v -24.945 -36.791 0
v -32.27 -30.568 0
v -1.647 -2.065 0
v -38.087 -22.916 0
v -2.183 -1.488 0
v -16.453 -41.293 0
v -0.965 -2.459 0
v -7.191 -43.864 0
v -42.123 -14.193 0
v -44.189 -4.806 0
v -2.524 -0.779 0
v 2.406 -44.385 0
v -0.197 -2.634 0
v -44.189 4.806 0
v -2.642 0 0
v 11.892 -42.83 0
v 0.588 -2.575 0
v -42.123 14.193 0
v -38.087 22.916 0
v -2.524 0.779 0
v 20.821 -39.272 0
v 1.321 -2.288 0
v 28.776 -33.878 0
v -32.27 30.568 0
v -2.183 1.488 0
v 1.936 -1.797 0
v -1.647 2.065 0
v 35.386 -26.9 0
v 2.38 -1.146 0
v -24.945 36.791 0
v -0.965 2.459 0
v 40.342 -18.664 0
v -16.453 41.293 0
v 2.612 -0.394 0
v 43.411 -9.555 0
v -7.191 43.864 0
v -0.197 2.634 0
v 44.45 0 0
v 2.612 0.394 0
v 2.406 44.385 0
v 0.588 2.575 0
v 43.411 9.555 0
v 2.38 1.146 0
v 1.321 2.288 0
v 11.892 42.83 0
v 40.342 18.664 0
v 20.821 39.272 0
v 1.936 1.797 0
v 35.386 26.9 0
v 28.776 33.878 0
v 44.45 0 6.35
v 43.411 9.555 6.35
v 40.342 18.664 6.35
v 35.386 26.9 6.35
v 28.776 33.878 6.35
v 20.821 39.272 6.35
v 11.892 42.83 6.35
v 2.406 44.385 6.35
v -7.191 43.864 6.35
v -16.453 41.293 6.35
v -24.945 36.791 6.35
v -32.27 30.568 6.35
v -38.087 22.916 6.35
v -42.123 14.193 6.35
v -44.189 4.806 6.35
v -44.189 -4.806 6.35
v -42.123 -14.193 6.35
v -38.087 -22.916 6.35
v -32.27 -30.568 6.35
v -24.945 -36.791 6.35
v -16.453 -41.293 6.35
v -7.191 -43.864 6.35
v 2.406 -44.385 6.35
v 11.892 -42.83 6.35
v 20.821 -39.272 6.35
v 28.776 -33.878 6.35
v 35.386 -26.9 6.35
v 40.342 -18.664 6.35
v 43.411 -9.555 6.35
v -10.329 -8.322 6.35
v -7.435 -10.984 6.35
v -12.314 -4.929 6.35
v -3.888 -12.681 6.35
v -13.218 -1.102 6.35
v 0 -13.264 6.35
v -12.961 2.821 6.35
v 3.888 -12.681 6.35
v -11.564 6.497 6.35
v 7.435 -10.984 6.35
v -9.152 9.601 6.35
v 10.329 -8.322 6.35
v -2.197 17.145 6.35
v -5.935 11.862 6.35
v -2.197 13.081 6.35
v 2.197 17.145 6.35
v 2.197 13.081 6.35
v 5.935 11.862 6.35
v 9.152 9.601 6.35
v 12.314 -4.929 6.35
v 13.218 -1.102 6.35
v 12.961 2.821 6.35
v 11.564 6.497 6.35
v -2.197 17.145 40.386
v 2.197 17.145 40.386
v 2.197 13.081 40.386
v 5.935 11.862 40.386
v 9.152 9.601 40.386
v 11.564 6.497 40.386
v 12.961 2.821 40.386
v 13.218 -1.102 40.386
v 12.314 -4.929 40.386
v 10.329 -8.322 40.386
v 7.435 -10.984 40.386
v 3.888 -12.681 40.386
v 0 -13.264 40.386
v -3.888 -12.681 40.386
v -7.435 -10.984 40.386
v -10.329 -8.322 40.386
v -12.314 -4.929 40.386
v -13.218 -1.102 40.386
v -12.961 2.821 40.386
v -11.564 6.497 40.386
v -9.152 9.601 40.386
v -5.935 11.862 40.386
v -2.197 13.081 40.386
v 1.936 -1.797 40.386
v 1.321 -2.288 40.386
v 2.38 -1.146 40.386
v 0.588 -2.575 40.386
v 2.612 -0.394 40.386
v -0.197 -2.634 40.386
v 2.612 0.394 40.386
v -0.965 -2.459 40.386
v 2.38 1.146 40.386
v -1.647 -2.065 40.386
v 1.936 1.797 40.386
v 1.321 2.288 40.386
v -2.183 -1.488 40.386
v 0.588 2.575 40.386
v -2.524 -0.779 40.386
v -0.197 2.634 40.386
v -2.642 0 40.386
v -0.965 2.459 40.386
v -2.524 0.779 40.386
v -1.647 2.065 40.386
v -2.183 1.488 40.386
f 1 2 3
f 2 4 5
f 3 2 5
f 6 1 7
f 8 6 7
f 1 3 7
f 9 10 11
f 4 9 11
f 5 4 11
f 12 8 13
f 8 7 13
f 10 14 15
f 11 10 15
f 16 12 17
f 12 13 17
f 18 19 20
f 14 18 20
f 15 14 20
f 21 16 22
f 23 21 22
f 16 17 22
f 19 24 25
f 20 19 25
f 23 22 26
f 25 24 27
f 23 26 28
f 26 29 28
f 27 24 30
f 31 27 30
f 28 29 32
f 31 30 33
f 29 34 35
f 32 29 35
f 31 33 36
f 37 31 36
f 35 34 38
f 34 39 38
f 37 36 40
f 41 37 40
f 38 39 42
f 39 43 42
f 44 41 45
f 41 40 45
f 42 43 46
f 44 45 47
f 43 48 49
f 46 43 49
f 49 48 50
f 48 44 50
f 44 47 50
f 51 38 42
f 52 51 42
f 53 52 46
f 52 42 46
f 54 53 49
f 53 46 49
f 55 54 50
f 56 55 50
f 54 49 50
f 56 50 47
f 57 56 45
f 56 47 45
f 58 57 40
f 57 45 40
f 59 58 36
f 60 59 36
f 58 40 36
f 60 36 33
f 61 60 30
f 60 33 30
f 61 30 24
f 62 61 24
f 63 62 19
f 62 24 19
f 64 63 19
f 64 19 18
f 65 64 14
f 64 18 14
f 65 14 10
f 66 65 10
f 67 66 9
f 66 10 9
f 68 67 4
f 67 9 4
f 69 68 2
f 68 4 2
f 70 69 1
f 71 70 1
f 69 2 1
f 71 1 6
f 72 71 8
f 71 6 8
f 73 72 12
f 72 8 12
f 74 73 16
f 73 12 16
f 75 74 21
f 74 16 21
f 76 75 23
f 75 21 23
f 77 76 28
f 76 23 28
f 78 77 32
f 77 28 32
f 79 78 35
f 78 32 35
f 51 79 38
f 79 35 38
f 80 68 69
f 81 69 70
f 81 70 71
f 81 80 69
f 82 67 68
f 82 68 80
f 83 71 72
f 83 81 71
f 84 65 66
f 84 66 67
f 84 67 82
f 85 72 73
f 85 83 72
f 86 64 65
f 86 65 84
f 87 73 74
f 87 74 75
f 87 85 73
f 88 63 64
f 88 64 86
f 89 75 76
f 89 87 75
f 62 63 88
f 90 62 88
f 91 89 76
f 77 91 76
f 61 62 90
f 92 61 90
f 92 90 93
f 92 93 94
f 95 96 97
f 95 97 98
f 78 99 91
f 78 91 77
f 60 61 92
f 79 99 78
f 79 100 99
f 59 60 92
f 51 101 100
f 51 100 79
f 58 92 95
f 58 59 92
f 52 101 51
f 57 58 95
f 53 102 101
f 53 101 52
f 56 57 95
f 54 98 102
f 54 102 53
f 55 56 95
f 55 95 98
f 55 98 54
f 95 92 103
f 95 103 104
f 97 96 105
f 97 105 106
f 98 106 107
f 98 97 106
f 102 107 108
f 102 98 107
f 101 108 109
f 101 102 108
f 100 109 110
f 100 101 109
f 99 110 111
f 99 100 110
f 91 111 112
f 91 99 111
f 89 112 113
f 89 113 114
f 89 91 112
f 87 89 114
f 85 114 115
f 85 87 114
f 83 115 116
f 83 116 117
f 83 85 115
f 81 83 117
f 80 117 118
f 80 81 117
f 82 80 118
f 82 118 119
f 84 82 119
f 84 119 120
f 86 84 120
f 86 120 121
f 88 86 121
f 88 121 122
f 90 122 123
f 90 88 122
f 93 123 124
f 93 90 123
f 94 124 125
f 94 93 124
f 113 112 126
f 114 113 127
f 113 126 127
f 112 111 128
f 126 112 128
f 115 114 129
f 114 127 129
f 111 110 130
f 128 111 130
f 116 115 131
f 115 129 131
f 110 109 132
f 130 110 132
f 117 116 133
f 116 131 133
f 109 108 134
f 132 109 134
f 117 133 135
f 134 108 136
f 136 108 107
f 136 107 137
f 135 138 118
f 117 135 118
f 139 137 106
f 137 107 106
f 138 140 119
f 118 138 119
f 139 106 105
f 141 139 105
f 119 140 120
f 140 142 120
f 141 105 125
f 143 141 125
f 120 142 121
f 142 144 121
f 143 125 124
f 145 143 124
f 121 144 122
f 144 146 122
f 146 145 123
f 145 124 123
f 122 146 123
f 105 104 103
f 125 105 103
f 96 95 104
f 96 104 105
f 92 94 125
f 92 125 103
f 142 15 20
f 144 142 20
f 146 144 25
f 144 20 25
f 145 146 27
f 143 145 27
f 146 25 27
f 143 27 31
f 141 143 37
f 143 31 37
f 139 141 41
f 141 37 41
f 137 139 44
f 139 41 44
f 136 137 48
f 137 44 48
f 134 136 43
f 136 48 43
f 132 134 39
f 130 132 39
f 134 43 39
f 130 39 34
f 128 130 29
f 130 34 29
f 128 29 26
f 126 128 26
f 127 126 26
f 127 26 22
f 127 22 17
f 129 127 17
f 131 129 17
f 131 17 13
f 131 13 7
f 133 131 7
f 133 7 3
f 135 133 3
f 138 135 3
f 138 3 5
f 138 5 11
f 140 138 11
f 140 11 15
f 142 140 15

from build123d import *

# Parameters (mm, degrees)
SKETCH1_R           = 44.45
BOSS_EXTRUDE1_DEPTH = 6.35
BOSS_EXTRUDE4_DEPTH = 34.036
SKETCH3_R           = 2.6416
CUT_EXTRUDE1_DEPTH  = 75.717026145


with BuildPart() as part:
    # Sketch1 → Boss-Extrude1 (new body)
    with BuildSketch(Plane.XY):
        Circle(SKETCH1_R)
    extrude(amount=BOSS_EXTRUDE1_DEPTH)

    # Sketch2 → Boss-Extrude4 (add)
    with BuildSketch(Plane.XY.offset(6.35)):
        with BuildLine():
            Line((-2.1971, 17.145), (2.1971, 17.145))
            Line((2.1971, 17.145), (2.1971, 13.081))
            ThreePointArc((2.1971, 13.081), (0, -13.264230449), (-2.1971, 13.081))
            Line((-2.1971, 13.081), (-2.1971, 17.145))
        make_face()
    extrude(amount=BOSS_EXTRUDE4_DEPTH)

    # Sketch3 → Cut-Extrude1 (cut, through all)
    with BuildSketch(Plane(origin=(0, 0, 0), x_dir=(-1, 0, 0), z_dir=(0, 0, -1))):
        Circle(SKETCH3_R)
    extrude(amount=-CUT_EXTRUDE1_DEPTH, mode=Mode.SUBTRACT)


solid = part.part
